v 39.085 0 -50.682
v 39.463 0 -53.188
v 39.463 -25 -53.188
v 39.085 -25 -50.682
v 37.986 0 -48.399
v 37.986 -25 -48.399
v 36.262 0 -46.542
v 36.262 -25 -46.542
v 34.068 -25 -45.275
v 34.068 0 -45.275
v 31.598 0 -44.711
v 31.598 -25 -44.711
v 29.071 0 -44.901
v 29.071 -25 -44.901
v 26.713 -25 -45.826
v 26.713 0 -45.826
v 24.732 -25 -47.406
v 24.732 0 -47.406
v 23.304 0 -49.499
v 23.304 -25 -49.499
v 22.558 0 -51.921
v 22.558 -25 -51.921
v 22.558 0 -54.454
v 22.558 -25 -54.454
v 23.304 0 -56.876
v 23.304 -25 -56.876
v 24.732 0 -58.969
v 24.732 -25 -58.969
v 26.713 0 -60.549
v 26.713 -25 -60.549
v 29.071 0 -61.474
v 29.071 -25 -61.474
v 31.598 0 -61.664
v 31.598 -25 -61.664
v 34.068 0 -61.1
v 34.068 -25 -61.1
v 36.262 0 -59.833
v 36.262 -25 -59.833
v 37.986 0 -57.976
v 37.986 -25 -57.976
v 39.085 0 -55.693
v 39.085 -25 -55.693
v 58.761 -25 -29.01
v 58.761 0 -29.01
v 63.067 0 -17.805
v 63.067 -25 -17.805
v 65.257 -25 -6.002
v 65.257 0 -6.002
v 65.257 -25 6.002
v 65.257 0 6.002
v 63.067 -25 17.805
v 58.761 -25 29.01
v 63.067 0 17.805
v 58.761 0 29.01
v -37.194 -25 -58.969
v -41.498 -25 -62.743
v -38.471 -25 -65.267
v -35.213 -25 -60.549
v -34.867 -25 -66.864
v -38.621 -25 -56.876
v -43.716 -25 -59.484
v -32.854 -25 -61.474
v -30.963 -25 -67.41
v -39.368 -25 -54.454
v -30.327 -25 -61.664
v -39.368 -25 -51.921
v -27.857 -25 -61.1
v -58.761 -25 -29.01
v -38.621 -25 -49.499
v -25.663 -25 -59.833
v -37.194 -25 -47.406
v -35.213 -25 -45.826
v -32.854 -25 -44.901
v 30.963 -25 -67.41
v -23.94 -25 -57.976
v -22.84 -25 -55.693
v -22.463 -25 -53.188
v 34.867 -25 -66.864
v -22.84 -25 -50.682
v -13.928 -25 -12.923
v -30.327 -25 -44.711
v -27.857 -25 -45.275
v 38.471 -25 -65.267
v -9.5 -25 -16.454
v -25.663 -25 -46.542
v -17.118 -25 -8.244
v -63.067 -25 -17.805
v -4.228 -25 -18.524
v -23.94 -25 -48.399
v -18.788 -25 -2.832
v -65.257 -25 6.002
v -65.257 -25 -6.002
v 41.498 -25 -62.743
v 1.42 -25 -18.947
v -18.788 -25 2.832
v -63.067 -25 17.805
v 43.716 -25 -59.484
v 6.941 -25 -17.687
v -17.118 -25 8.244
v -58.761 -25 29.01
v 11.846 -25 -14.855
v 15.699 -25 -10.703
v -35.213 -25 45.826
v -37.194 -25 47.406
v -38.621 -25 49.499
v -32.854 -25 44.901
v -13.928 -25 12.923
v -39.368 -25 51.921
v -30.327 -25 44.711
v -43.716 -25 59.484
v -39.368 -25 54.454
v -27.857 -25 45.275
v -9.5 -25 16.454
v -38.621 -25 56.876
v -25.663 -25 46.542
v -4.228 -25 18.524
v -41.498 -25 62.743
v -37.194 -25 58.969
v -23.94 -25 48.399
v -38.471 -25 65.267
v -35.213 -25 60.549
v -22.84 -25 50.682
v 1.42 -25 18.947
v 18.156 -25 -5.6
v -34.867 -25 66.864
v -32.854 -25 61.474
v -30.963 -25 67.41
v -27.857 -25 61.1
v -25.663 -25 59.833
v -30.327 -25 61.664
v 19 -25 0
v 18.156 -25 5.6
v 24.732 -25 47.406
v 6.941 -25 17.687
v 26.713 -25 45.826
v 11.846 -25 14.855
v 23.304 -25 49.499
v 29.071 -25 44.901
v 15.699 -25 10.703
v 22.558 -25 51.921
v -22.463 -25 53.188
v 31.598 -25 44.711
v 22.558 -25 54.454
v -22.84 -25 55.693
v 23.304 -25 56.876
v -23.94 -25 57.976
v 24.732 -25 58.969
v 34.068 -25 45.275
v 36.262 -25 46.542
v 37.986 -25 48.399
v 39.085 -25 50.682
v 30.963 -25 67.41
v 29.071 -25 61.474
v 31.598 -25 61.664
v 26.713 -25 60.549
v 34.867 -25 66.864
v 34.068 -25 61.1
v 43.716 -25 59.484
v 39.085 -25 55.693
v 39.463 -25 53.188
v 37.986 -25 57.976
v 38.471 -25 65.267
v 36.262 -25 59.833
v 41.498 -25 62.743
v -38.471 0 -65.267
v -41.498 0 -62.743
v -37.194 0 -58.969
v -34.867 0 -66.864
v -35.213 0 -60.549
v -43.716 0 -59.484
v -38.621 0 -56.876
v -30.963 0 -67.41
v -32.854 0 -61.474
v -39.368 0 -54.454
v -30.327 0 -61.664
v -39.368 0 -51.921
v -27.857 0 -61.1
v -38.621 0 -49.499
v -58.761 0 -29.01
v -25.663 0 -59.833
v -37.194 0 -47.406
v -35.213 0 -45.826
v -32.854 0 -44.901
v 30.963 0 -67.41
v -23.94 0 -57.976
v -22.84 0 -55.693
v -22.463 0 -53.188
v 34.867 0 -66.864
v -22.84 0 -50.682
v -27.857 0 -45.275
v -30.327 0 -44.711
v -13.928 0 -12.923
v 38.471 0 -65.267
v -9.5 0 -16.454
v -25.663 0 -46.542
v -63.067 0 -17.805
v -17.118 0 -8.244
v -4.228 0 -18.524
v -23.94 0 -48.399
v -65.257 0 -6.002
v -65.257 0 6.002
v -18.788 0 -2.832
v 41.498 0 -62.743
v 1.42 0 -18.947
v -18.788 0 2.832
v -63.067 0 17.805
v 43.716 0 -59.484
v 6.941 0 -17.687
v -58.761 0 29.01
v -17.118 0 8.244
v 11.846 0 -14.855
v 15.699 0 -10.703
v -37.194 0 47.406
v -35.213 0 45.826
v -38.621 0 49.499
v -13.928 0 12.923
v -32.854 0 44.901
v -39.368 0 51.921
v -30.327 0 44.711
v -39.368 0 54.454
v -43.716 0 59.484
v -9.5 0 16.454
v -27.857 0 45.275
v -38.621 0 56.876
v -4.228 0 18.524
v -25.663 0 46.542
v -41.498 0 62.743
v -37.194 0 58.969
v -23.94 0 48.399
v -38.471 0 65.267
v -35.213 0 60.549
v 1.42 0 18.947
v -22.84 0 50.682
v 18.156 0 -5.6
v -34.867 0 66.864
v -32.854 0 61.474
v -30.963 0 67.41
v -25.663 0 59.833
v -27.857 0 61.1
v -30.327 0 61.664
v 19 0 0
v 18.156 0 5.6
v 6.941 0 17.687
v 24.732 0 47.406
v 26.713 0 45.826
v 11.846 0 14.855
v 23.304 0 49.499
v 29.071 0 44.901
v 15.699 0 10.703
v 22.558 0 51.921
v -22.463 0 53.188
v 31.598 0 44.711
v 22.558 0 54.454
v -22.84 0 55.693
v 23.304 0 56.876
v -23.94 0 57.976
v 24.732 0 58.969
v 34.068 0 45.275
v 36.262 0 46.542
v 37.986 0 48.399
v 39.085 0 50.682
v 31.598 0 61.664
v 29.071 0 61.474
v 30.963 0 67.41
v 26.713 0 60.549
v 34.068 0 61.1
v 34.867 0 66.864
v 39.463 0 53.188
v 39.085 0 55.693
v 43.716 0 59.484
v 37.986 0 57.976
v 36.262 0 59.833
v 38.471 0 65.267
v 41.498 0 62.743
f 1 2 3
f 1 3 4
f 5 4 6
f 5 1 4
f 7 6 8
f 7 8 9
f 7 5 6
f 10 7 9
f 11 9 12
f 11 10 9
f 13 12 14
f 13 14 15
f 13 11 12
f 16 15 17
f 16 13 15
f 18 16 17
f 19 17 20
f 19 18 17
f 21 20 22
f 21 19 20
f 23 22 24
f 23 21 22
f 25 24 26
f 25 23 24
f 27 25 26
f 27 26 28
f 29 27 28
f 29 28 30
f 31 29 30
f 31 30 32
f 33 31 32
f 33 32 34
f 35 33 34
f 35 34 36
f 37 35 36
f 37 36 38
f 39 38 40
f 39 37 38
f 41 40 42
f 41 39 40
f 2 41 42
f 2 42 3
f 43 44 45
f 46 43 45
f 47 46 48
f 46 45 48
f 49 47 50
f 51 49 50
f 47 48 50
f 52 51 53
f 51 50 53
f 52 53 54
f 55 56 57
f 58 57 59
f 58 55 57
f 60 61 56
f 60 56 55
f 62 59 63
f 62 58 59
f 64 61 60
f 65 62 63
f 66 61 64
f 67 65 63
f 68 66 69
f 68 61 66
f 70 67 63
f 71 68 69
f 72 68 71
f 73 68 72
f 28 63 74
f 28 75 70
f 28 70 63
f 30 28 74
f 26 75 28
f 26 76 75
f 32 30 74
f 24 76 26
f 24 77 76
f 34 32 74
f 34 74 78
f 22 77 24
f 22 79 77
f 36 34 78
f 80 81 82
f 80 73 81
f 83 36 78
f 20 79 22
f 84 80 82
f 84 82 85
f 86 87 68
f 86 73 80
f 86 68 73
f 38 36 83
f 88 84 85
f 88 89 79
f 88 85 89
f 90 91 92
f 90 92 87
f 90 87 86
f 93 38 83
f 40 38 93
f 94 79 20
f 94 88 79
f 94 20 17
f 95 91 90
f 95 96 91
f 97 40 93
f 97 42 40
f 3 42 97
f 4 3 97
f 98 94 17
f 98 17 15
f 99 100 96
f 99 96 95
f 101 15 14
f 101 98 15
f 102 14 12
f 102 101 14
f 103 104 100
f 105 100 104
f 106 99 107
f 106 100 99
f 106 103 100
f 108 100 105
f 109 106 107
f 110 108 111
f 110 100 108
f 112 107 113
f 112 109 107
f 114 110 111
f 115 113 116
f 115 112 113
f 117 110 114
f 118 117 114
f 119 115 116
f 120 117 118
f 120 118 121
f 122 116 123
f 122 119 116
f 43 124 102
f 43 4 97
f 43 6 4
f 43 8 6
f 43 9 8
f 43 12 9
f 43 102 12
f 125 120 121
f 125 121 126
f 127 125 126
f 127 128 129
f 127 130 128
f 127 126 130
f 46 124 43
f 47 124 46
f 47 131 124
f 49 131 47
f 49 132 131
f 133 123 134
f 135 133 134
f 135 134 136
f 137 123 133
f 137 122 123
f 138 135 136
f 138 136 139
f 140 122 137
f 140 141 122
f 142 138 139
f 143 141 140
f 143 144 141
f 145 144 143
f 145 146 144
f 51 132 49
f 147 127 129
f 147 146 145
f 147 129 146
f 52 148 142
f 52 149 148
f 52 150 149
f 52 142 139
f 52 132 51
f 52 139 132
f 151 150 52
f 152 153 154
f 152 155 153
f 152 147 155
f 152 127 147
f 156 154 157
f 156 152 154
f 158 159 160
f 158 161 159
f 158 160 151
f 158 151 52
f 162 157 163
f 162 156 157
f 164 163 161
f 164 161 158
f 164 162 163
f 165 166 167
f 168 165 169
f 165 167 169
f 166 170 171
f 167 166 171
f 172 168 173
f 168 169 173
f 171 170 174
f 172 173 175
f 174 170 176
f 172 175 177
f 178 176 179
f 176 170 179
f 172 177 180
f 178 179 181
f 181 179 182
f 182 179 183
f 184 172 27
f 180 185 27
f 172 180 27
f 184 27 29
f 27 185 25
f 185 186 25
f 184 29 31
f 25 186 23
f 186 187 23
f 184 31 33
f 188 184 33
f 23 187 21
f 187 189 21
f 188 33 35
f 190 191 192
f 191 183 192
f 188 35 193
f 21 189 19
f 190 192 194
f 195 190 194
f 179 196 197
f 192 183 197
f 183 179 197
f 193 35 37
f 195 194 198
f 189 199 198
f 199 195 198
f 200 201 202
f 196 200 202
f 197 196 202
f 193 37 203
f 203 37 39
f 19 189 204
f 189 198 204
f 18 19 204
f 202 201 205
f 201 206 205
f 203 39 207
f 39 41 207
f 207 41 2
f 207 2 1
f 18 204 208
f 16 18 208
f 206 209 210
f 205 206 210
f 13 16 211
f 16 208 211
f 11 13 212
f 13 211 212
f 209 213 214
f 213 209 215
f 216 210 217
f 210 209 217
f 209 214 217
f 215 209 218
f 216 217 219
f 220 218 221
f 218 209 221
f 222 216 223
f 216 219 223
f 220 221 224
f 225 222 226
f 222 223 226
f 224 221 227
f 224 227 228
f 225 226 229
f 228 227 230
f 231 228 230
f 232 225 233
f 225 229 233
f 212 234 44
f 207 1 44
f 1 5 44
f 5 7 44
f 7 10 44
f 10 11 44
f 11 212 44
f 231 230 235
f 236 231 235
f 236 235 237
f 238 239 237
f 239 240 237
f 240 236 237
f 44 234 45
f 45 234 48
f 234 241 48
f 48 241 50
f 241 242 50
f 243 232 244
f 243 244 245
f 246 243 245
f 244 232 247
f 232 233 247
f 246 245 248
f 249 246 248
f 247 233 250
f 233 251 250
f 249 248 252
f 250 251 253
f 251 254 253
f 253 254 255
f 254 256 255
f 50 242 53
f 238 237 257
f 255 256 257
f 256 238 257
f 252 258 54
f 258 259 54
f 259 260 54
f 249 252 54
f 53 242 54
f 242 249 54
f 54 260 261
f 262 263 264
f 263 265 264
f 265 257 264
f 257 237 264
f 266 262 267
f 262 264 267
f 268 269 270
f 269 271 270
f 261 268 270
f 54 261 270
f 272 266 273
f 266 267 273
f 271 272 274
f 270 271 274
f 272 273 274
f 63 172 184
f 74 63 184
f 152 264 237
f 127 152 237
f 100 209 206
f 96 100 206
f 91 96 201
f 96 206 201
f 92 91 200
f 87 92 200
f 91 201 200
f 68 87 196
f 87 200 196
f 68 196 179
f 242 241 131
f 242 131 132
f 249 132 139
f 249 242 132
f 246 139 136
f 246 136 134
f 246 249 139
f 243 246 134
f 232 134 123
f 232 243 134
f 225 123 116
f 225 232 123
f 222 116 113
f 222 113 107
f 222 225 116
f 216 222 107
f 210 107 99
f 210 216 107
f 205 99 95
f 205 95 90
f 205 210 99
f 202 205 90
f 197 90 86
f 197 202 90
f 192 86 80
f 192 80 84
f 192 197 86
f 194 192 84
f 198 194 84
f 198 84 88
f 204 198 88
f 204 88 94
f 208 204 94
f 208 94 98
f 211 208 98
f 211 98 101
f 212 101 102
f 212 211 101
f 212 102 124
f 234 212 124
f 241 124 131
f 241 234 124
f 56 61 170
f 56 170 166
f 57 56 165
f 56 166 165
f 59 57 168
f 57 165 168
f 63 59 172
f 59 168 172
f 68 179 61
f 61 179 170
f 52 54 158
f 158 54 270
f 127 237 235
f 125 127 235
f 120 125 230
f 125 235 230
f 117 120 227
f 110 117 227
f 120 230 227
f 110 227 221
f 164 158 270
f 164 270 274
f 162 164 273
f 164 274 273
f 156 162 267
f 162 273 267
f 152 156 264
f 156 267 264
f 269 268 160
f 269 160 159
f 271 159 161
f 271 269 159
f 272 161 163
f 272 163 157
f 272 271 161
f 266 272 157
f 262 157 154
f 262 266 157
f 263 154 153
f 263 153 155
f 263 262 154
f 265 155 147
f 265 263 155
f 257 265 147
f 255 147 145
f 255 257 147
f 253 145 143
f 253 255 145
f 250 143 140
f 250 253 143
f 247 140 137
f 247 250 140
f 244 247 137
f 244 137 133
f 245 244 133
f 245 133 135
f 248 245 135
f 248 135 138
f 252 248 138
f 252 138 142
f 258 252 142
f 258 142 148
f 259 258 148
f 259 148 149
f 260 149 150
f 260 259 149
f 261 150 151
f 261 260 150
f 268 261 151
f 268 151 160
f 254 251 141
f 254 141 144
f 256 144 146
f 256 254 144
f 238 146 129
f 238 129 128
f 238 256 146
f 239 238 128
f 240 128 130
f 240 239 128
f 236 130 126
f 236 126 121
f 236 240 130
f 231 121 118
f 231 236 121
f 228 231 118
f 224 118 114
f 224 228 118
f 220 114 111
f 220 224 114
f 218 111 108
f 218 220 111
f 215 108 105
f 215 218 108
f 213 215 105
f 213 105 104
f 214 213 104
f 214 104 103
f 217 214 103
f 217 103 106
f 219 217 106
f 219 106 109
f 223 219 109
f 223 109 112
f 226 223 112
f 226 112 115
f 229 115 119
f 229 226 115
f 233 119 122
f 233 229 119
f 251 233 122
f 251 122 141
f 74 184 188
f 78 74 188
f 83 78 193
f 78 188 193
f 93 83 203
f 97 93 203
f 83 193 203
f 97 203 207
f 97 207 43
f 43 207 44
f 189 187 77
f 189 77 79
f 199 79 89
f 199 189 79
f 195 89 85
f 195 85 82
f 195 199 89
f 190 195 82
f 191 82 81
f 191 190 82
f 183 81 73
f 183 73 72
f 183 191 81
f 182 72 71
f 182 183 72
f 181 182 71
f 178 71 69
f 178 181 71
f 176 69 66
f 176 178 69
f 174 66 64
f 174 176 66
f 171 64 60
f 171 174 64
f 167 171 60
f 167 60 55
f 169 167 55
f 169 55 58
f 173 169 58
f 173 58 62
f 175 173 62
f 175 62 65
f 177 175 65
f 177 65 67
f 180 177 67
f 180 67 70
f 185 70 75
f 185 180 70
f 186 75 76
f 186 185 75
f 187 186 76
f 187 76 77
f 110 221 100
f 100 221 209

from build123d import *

# Parameters (mm, degrees)
F0_R     = 8.5
F0_R_2   = 19
F1_DEPTH = 25


with BuildPart() as f1:
    # F0 (on Front) → F1 (new body)
    with BuildSketch(Plane.XZ):
        with BuildLine():
            Line((-43.715996, 59.483897), (-58.76085, 29.010438))
            ThreePointArc((-58.76085, 29.010438), (-65.532, 0), (-58.76085, -29.010438))
            Line((-58.76085, -29.010438), (-43.715996, -59.483897))
            ThreePointArc((-43.715996, -59.483897), (-38.470598, -65.267388), (-30.9626, -67.4105))
            Line((-30.9626, -67.4105), (30.9626, -67.4105))
            ThreePointArc((30.9626, -67.4105), (38.470598, -65.267388), (43.715996, -59.483897))
            Line((43.715996, -59.483897), (58.76085, -29.010438))
            ThreePointArc((58.76085, -29.010438), (65.532, 0), (58.76085, 29.010438))
            Line((58.76085, 29.010438), (43.715996, 59.483897))
            ThreePointArc((43.715996, 59.483897), (38.470598, 65.267388), (30.9626, 67.4105))
            Line((30.9626, 67.4105), (-30.9626, 67.4105))
            ThreePointArc((-30.9626, 67.4105), (-38.470598, 65.267388), (-43.715996, 59.483897))
        make_face()
        with Locations((-30.9626, -53.1875)):
            Circle(F0_R, mode=Mode.SUBTRACT)
        with Locations((30.9626, -53.1875)):
            Circle(F0_R, mode=Mode.SUBTRACT)
        Circle(F0_R_2, mode=Mode.SUBTRACT)
        with Locations((-30.9626, 53.1875)):
            Circle(F0_R, mode=Mode.SUBTRACT)
        with Locations((30.9626, 53.1875)):
            Circle(F0_R, mode=Mode.SUBTRACT)
    extrude(amount=F1_DEPTH)


solid = f1.part
